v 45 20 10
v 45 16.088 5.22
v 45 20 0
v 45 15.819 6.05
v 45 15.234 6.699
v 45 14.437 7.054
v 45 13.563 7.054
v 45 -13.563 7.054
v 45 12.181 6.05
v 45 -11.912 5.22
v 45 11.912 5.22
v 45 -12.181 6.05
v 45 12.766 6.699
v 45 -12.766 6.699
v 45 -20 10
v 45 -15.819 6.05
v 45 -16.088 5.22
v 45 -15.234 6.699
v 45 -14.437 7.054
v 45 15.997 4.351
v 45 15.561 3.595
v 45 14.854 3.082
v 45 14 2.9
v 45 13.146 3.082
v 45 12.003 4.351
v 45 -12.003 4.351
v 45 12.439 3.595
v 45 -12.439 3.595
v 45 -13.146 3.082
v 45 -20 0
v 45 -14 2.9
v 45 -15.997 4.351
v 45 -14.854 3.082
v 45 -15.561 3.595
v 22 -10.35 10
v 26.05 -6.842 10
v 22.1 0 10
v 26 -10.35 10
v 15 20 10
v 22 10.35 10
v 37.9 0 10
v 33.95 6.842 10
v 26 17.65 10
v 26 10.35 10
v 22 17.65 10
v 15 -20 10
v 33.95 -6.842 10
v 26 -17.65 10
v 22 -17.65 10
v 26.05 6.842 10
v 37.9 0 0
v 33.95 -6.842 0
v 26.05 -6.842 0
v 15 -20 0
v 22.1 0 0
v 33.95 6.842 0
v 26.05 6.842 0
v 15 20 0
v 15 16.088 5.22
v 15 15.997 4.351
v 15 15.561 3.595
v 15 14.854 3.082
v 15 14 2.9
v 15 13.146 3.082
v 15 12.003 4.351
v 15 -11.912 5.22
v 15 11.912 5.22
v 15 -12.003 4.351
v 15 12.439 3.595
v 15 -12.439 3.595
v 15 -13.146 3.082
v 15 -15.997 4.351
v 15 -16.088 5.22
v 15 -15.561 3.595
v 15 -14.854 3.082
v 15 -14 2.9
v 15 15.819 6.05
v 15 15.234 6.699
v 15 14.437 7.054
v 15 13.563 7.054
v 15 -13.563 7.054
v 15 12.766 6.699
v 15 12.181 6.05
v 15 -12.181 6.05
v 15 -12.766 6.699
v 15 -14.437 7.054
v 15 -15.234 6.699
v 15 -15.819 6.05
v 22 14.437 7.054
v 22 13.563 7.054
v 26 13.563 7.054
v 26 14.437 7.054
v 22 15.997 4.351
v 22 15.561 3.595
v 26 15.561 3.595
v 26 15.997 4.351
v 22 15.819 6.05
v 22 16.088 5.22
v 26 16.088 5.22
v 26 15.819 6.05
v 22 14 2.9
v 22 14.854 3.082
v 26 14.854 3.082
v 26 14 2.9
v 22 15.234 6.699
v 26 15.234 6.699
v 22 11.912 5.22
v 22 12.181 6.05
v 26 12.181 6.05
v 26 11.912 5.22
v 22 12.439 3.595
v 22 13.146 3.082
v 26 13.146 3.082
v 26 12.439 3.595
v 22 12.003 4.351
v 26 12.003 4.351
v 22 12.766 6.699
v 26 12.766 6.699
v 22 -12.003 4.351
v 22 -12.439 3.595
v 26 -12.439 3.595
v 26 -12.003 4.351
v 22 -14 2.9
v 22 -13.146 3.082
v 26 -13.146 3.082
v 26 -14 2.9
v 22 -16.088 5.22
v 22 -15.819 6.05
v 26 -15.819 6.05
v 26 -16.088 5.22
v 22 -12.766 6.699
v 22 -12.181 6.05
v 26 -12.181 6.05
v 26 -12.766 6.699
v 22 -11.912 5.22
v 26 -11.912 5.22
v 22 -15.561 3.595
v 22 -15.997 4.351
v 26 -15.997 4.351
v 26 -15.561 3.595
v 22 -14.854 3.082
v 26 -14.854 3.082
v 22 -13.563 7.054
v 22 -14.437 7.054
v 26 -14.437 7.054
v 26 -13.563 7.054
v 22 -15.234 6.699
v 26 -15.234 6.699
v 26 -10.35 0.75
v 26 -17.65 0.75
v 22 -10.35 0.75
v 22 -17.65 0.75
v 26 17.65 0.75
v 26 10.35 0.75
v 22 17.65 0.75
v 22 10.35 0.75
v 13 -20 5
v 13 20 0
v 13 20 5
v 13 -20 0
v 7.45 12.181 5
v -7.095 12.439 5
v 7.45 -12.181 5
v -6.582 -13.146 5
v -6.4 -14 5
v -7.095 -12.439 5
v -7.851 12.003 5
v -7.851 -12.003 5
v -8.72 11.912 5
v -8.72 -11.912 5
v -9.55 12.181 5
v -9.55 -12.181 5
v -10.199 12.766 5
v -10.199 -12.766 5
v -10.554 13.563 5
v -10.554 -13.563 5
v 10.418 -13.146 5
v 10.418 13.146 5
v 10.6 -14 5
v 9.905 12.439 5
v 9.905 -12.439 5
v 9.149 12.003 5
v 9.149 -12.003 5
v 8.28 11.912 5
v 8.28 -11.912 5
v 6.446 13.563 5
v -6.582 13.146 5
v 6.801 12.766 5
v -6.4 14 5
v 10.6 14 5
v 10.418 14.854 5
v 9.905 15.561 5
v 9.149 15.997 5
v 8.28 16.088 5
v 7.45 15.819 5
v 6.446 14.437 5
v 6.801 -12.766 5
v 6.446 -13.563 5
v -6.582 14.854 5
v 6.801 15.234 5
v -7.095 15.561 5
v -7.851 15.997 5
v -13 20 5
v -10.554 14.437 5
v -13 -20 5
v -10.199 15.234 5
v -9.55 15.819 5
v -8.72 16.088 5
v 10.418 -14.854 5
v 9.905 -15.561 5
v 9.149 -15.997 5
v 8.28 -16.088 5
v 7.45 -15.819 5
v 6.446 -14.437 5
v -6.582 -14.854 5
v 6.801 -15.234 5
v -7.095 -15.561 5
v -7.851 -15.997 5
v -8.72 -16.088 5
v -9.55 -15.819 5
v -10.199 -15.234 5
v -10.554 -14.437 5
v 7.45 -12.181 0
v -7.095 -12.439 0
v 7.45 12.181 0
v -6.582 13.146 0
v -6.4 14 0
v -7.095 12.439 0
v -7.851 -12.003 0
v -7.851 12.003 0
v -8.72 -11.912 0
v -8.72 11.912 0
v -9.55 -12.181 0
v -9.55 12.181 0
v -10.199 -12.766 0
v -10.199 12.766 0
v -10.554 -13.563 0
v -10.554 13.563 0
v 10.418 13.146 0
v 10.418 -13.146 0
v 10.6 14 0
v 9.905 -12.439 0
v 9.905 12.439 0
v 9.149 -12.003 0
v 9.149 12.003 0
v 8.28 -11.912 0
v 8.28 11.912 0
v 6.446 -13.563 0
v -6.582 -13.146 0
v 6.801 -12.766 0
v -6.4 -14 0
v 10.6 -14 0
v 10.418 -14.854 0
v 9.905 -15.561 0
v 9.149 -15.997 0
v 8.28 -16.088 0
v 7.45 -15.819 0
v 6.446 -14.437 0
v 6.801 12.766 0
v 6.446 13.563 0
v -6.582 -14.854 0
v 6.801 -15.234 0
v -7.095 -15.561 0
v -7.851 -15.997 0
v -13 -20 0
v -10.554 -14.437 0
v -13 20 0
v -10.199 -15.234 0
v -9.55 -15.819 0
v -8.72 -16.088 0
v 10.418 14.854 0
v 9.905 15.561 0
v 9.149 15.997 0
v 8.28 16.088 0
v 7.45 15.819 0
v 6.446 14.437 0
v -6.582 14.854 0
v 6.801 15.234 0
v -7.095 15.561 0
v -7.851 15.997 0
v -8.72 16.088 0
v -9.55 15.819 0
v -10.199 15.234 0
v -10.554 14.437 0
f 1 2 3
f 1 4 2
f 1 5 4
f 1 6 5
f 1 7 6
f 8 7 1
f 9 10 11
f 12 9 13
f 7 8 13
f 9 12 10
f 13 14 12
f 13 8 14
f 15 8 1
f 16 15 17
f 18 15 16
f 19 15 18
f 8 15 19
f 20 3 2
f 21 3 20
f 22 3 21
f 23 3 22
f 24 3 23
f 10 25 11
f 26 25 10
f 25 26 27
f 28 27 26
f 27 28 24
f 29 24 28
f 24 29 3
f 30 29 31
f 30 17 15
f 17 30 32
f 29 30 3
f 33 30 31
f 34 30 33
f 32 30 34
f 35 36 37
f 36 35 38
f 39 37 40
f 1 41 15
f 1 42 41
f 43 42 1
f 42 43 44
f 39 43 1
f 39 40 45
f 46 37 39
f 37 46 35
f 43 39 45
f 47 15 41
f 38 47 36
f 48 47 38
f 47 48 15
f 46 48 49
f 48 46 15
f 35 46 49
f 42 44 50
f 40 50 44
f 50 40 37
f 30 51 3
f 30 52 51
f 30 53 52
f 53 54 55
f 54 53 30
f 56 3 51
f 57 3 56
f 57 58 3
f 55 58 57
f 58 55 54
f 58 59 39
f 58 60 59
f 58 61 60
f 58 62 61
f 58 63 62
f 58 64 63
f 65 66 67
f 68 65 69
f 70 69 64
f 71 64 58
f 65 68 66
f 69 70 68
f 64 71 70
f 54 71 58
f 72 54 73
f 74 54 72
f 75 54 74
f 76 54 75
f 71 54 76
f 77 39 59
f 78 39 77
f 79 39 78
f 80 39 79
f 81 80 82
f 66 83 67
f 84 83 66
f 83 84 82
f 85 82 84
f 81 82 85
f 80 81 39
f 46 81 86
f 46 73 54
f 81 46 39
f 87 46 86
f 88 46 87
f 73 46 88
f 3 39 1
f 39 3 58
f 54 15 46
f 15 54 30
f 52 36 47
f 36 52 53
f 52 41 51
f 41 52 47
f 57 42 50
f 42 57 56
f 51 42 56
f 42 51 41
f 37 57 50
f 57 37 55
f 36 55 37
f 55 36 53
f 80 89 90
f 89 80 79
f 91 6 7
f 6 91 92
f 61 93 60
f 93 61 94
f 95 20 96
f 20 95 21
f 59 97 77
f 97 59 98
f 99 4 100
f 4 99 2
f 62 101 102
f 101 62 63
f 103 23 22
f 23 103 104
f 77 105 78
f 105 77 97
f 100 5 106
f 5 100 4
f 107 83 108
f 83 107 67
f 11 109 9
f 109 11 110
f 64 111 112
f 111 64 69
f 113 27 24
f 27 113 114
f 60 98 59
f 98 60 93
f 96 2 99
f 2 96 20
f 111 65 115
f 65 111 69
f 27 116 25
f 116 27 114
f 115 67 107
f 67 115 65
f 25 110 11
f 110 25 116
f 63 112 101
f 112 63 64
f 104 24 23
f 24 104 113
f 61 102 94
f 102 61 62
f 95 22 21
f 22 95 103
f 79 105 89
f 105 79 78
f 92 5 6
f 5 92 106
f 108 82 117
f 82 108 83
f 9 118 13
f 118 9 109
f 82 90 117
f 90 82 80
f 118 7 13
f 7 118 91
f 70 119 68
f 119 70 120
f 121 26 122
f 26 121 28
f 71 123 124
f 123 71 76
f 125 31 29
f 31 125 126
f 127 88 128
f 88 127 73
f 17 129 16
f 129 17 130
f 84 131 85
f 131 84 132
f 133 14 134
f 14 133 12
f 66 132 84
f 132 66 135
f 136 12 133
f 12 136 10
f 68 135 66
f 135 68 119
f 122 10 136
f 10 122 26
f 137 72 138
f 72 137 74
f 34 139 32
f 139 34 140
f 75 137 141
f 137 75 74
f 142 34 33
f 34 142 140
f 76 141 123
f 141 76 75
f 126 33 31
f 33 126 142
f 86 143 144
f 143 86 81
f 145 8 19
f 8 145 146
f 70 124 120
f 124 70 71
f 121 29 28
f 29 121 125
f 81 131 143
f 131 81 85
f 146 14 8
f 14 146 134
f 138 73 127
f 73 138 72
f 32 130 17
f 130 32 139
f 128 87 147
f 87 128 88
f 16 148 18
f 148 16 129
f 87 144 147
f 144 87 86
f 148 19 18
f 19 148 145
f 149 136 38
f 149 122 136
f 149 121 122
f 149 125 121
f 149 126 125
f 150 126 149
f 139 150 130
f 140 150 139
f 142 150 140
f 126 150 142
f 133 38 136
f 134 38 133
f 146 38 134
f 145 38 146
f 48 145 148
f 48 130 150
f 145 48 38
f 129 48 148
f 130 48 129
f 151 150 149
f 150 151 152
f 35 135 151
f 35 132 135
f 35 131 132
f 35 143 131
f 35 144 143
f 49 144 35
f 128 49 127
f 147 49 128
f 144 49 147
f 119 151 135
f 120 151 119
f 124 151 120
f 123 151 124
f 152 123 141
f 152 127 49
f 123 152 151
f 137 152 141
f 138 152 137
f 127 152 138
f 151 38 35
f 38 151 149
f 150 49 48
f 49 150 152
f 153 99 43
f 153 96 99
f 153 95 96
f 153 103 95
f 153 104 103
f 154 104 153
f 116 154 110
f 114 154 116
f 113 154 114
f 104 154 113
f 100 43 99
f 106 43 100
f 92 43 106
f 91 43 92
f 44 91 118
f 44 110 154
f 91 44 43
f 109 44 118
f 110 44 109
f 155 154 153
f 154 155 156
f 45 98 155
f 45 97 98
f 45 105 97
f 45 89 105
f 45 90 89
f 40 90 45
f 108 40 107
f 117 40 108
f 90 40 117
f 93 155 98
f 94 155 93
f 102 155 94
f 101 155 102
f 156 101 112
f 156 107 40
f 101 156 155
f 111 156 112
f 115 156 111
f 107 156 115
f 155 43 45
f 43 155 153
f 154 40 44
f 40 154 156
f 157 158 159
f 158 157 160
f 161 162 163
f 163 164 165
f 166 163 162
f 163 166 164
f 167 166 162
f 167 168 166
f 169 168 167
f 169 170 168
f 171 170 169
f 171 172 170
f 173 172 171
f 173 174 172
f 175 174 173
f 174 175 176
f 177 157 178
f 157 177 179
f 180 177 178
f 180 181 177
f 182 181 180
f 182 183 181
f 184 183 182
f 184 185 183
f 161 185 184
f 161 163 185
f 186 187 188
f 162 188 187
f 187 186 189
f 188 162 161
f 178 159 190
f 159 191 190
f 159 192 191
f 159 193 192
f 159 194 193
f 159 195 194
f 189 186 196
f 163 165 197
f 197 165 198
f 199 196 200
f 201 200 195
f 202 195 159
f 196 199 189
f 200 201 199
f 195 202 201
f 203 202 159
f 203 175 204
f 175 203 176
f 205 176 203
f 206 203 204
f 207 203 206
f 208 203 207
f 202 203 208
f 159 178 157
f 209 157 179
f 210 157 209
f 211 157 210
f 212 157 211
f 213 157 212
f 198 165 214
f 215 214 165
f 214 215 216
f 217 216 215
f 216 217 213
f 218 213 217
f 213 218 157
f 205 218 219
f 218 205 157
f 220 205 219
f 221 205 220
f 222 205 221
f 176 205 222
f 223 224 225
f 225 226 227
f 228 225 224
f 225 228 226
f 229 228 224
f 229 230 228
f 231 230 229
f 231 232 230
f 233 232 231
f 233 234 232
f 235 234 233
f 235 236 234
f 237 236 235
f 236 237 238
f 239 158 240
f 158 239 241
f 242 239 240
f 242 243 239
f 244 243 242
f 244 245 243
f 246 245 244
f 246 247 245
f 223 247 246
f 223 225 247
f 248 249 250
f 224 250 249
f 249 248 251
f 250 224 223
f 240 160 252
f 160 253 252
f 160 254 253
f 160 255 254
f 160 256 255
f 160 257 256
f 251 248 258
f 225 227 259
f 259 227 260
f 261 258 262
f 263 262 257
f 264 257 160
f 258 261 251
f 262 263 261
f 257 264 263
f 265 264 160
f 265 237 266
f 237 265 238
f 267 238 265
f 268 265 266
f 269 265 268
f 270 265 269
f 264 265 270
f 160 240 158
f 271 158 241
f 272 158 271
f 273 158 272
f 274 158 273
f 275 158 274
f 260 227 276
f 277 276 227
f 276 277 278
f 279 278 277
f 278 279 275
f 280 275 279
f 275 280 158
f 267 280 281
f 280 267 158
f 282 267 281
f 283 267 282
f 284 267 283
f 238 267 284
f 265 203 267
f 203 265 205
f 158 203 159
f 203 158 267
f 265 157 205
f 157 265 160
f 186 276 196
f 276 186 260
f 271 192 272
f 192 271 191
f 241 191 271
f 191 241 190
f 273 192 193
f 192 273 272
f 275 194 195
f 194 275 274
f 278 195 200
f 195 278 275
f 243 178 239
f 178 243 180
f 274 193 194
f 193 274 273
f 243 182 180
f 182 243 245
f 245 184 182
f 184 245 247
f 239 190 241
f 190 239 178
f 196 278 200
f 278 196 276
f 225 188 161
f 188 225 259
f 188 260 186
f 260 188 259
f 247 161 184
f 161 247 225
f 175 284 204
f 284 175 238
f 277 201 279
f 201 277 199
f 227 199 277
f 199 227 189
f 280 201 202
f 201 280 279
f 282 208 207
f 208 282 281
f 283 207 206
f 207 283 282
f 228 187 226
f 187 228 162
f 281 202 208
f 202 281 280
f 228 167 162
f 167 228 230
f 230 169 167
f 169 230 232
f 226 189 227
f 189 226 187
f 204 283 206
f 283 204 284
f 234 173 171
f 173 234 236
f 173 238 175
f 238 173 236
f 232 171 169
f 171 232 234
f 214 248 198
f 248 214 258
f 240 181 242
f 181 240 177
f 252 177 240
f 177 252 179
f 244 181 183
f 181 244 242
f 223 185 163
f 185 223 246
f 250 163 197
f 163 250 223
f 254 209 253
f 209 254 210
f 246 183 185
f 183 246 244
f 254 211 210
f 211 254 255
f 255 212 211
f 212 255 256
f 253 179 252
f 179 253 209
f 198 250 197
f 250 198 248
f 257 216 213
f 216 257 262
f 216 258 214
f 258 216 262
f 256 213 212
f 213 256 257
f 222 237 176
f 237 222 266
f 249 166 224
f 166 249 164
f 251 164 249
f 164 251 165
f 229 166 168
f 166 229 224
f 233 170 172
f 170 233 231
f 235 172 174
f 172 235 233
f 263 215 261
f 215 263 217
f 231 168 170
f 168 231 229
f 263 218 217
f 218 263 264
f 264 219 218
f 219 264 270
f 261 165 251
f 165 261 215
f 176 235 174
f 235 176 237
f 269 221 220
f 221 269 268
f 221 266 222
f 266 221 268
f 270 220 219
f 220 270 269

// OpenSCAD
ancho_pared=6;

module tensor(){
	difference(){

		cube([30,40,10],center=true);

		cylinder(r=15.8/2,h=100,center=true , $fn=6);
		translate([30,0,0]) rotate([0,0,0])
		cube([20,40,40],center=true);

		translate([0,14,0]) rotate([0,90,0])
		cylinder(r=4.2/2,h=100,center=true , $fn=15);

		translate([0,-14,0]) rotate([0,90,0])
		cylinder(r=4.2/2,h=100,center=true , $fn=15);

		translate([-6,-14,0.75]) rotate([0,0,0])
		cube([4,7.30,10],center=true);

		translate([-6,14,0.75]) rotate([0,0,0])
		cube([4,7.30,10],center=true);
	}
}
module placa(){
	difference(){	
		cube([ancho_pared+20,40,5],center=true);
		
		translate([ancho_pared+5/2,14,0]) rotate([0,0,0])
		cylinder(r=4.2/2,h=100,center=true , $fn=15);

		translate([-ancho_pared-5/2,14,0]) rotate([0,0,0])
		cylinder(r=4.2/2,h=100,center=true , $fn=15);

		translate([ancho_pared+5/2,-14,0]) rotate([0,0,0])
		cylinder(r=4.2/2,h=100,center=true , $fn=15);

		translate([-ancho_pared-5/2,-14,0]) rotate([0,0,0])
		cylinder(r=4.2/2,h=100,center=true , $fn=15);	

	}
}

translate([30,0,5]) rotate([0,0,0])
tensor();

translate([0,0,2.5]) rotate([0,0,0])
placa();
